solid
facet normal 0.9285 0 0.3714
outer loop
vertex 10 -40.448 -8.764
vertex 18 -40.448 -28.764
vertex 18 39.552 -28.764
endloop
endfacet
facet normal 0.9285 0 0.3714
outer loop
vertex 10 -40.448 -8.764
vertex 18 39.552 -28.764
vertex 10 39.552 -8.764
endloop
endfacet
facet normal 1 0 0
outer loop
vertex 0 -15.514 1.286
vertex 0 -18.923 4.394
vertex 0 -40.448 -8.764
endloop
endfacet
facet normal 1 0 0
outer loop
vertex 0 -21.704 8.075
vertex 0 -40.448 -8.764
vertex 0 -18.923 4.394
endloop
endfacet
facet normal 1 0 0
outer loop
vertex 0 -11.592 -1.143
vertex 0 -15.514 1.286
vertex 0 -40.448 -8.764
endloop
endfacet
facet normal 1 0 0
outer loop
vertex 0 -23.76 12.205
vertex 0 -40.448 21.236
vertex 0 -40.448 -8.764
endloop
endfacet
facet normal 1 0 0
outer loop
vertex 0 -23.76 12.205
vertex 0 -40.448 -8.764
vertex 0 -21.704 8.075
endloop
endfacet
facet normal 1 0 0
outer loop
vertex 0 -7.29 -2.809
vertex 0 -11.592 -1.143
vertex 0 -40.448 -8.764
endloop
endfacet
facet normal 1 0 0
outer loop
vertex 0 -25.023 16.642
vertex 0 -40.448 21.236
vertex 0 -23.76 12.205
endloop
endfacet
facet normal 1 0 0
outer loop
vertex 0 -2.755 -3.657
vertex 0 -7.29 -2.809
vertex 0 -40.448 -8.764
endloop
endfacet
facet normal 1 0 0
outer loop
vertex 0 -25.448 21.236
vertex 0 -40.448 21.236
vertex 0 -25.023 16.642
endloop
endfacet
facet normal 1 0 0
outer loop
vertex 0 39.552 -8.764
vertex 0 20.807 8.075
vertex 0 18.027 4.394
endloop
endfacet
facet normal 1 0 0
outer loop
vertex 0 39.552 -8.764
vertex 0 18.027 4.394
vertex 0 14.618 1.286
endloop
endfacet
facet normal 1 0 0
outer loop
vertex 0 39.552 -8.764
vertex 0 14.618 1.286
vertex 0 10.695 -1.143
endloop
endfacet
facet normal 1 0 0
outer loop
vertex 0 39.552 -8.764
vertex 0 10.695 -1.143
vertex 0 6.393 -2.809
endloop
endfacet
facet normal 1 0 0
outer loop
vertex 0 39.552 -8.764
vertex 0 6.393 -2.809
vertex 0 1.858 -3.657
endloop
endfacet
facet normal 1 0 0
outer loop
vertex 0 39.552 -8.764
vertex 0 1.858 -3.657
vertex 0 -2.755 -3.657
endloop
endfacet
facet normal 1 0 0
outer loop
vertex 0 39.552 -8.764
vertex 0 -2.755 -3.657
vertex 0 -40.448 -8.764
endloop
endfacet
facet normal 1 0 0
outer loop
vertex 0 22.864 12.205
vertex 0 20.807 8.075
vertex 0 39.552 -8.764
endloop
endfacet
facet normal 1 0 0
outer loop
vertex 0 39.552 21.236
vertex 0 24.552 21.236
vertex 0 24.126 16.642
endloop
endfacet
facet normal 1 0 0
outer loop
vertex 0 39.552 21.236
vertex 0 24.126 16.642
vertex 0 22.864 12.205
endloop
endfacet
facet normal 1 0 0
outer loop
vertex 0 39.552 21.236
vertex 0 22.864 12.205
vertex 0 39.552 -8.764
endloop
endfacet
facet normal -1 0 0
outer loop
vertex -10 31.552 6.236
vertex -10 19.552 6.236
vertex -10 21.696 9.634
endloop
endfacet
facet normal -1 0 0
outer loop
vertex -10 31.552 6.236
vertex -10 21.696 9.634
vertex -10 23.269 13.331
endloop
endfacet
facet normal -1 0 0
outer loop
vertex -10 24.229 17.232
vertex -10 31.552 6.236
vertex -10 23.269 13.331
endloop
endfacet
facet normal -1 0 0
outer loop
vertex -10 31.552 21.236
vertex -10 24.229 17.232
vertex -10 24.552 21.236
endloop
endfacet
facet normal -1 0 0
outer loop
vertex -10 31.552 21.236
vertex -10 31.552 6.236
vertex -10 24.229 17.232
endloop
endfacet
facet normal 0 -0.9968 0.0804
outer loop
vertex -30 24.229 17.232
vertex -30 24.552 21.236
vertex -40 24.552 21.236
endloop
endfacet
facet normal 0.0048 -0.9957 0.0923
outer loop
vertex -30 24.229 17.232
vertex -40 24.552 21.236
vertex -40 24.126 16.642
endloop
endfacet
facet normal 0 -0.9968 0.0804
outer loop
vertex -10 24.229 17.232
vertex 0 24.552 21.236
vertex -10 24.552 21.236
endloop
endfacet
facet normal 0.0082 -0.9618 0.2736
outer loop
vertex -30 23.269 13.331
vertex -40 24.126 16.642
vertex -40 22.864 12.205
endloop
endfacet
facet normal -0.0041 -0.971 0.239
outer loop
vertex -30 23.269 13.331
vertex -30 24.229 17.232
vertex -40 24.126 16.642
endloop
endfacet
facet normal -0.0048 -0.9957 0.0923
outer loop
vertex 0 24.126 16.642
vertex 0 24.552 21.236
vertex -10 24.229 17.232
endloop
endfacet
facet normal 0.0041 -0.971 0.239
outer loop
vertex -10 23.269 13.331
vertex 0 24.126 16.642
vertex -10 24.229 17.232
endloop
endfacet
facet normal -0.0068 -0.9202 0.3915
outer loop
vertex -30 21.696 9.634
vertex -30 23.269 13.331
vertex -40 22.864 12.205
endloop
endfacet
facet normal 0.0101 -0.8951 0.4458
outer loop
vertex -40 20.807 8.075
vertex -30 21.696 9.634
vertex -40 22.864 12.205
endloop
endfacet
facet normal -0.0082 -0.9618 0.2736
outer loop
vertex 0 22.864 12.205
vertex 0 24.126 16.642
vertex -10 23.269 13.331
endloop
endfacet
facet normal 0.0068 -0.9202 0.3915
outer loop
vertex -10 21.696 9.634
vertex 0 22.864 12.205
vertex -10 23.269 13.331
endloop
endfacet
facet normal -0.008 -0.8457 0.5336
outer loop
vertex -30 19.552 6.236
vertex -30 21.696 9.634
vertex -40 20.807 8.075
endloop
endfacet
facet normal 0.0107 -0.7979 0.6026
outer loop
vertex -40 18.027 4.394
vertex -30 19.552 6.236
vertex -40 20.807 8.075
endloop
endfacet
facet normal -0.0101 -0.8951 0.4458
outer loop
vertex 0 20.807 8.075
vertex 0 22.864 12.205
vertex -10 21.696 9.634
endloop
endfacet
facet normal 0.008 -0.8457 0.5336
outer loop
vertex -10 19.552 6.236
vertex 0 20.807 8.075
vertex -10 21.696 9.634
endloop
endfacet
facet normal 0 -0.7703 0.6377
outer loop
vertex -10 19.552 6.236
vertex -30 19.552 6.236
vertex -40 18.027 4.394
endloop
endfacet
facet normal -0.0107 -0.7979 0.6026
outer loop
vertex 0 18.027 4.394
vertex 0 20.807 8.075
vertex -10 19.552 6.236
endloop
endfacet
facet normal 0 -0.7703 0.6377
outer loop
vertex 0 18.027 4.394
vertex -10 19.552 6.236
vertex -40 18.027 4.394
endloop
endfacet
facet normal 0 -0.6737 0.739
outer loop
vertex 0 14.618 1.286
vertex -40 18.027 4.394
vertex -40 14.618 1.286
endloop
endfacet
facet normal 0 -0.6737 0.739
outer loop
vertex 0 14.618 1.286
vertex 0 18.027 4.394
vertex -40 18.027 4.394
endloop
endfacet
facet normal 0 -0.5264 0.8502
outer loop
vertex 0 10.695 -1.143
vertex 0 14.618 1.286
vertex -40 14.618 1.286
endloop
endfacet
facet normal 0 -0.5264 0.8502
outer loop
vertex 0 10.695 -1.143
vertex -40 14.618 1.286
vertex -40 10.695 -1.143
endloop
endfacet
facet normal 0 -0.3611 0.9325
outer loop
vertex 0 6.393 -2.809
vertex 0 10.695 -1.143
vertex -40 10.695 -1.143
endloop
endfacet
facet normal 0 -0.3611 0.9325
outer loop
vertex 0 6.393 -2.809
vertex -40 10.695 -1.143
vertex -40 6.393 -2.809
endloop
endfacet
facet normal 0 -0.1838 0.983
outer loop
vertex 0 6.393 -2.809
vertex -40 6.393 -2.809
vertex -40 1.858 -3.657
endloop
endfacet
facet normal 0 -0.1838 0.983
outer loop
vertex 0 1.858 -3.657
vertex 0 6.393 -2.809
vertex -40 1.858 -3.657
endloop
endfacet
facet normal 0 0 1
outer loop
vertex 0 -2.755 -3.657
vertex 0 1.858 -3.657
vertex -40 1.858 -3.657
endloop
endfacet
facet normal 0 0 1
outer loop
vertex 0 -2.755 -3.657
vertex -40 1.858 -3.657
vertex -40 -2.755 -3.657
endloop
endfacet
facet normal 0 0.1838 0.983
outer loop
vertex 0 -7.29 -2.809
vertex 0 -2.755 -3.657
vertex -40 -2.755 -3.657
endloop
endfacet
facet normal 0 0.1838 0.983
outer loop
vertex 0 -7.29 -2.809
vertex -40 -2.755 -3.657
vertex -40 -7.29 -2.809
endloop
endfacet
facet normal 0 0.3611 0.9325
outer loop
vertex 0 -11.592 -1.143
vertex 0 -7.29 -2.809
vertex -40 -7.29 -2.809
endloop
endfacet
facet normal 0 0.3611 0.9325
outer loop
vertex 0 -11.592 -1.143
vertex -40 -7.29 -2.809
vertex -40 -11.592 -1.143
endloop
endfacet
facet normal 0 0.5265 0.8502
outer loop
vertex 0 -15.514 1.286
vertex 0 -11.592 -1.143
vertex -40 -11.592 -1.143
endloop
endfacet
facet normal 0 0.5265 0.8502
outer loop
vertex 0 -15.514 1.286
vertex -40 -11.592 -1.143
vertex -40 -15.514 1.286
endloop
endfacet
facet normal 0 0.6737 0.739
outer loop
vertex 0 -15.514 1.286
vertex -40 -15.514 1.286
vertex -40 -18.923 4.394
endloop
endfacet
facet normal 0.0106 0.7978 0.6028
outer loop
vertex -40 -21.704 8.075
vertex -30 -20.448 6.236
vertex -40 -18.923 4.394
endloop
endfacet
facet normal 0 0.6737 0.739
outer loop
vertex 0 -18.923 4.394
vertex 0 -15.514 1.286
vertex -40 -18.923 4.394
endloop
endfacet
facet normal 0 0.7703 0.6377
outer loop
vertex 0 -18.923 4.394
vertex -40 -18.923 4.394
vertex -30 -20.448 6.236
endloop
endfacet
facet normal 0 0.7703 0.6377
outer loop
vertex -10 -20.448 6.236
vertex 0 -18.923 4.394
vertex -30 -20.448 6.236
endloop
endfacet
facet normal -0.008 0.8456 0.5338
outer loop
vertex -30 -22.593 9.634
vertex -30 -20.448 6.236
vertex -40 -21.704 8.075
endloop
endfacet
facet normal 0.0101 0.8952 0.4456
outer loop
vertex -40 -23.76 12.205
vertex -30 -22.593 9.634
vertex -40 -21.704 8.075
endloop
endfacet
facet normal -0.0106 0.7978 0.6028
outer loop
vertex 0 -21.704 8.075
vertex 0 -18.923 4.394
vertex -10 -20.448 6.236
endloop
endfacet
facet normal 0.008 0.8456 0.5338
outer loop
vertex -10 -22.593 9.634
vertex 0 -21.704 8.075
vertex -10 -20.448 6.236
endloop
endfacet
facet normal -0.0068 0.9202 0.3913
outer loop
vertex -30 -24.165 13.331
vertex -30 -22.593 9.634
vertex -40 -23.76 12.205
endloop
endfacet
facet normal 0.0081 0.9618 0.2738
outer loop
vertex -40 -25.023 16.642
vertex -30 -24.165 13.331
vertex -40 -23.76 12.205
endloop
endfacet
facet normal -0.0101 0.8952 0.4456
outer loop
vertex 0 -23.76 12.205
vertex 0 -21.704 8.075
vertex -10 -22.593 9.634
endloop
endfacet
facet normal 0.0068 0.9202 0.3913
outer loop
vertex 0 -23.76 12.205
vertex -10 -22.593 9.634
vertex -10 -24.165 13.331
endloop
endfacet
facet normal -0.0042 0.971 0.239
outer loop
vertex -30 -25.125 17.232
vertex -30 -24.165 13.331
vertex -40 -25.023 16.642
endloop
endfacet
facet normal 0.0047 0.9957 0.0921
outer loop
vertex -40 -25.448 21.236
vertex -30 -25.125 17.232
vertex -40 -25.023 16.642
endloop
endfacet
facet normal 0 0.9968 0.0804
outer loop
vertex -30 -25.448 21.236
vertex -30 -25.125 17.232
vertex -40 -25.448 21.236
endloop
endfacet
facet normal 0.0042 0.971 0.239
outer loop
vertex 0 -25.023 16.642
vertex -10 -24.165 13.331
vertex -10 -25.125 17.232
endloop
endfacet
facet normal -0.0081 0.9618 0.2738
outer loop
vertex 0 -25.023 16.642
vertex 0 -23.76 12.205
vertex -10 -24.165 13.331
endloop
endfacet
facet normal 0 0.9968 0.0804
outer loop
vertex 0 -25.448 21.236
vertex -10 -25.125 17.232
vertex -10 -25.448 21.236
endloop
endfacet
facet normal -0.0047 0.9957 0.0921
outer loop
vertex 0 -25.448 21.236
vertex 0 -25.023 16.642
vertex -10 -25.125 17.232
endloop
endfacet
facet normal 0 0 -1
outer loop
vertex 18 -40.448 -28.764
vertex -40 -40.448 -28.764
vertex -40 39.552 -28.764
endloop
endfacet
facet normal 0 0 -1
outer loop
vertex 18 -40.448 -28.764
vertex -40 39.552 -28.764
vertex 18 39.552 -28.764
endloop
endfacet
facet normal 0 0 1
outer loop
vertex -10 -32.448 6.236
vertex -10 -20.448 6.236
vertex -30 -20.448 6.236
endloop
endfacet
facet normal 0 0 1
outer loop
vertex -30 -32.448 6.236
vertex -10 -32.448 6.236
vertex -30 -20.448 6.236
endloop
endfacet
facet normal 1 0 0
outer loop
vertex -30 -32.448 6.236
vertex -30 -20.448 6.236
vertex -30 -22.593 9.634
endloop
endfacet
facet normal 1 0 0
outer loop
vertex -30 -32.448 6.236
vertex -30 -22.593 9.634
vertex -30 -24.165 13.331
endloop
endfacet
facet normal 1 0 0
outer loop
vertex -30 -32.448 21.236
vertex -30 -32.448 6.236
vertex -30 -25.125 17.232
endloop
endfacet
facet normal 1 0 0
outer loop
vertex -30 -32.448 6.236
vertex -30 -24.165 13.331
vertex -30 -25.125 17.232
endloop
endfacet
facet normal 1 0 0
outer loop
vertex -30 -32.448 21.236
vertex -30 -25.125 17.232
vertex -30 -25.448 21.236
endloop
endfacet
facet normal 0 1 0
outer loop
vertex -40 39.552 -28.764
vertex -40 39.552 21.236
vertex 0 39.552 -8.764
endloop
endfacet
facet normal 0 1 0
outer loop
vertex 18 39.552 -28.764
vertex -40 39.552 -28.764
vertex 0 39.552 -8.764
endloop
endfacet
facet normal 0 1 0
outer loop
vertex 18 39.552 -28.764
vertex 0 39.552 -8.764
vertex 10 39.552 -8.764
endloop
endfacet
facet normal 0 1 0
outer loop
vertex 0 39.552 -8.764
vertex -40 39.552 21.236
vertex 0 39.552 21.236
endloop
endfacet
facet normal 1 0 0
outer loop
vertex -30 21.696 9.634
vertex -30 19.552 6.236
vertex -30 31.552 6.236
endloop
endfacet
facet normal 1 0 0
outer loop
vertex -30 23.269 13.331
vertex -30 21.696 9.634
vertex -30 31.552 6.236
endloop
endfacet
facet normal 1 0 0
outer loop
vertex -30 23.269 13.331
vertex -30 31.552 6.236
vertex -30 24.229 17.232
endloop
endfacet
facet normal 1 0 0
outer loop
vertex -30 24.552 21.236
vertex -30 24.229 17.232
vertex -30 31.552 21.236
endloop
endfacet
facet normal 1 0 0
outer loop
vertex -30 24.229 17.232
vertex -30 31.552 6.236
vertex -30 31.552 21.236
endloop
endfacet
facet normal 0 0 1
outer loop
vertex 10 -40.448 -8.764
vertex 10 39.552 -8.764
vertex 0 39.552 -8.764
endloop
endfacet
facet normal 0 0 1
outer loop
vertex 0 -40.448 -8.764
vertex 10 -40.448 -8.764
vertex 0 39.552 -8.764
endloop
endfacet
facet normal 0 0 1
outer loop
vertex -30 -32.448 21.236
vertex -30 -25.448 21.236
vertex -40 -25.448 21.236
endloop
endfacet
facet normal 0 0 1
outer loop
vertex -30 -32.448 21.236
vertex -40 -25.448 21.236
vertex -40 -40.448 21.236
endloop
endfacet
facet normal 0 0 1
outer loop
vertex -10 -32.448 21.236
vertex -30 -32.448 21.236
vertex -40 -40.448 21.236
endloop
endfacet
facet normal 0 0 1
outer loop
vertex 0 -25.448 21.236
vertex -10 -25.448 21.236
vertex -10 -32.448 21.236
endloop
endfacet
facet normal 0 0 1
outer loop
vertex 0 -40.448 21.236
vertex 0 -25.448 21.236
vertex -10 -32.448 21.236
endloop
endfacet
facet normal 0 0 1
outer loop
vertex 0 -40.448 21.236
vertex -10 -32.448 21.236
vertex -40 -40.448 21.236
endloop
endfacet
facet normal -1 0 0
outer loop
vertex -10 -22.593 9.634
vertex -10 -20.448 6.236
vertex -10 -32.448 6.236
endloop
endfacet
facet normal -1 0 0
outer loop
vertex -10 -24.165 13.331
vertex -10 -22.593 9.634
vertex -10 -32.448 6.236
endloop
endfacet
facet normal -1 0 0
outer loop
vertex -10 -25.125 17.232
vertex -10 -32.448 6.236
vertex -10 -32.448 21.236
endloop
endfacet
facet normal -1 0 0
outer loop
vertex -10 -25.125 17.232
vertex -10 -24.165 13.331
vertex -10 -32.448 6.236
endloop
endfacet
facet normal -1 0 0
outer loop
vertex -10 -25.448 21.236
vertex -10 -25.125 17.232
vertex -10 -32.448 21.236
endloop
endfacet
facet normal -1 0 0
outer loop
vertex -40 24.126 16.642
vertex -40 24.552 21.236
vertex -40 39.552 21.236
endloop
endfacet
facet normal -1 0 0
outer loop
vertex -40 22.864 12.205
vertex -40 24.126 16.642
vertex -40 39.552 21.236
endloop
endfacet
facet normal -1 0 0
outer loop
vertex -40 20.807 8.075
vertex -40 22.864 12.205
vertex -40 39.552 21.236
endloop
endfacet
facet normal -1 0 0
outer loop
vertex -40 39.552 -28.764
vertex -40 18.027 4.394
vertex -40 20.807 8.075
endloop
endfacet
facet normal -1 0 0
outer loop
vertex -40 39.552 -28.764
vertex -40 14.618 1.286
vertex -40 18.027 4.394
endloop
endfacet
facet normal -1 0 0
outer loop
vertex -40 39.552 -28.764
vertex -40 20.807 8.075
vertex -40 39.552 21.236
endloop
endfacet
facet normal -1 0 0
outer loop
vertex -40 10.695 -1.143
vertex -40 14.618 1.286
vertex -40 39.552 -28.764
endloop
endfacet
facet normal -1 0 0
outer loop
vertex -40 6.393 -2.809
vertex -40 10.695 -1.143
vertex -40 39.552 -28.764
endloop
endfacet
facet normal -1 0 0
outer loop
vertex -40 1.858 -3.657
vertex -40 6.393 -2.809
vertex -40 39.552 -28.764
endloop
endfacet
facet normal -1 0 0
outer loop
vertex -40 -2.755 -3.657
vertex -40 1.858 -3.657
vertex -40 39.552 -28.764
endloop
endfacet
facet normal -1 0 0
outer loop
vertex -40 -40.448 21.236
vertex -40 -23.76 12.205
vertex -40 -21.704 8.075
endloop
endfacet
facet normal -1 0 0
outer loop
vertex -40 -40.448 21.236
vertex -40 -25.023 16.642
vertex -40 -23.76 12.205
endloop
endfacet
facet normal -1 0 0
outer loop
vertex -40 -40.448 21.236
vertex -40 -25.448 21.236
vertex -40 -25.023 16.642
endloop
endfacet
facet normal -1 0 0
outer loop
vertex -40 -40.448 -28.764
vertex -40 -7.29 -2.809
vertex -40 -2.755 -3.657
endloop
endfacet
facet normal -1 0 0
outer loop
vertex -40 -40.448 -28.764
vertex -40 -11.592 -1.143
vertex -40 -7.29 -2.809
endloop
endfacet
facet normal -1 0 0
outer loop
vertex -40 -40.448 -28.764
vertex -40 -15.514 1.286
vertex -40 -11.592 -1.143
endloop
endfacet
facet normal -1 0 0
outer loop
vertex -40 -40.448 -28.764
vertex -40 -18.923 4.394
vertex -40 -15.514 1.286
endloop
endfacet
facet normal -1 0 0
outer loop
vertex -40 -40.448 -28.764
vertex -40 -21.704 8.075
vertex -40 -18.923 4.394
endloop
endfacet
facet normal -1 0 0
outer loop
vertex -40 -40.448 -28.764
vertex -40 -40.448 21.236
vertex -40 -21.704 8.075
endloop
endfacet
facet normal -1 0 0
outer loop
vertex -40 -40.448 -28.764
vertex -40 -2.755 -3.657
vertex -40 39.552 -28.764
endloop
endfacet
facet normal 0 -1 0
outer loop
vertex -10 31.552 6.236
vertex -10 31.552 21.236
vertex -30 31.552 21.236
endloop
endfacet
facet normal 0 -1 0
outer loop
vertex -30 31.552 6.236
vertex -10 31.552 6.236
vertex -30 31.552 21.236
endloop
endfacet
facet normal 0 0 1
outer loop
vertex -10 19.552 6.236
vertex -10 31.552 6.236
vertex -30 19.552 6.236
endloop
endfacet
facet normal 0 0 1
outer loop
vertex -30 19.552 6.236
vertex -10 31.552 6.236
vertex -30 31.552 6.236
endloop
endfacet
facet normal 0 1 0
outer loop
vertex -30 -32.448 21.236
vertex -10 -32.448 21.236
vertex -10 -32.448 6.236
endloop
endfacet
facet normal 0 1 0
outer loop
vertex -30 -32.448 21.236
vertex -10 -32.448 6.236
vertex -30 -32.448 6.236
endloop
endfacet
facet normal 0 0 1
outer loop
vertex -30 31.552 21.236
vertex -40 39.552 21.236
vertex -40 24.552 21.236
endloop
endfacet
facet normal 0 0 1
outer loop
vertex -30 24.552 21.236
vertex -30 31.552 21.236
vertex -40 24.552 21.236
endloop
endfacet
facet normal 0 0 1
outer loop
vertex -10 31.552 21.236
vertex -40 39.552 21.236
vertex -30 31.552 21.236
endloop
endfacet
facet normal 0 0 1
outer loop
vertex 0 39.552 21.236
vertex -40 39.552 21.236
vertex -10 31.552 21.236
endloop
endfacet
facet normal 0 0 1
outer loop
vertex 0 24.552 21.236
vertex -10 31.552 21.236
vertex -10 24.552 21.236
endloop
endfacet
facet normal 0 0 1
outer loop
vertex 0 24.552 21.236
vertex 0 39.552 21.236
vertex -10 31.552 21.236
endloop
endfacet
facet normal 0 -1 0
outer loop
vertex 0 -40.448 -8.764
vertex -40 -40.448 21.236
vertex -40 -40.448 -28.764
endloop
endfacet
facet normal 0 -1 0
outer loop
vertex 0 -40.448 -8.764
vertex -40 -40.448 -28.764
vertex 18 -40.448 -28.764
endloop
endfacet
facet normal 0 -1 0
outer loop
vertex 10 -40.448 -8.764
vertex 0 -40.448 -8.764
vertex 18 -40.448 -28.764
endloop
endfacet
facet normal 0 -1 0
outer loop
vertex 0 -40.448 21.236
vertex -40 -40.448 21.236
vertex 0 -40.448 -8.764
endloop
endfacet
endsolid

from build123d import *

# Parameters (mm, degrees)
F1_DEPTH = 40
F3_DEPTH = 80
F5_W     = 20
F5_H     = 15
F6_DEPTH = 64


with BuildPart() as f1:
    # F0 (on Right) → F1 (new body)
    with BuildSketch(Plane.YZ):
        with BuildLine():
            Line((-25.4482409358, 21.236214526), (-40.4482409358, 21.236214526))
            Line((-40.4482409358, 21.236214526), (-40.4482409358, -8.763785474))
            Line((-40.4482409358, -8.763785474), (39.5517590642, -8.763785474))
            Line((39.5517590642, -8.763785474), (39.5517590642, 21.236214526))
            Line((39.5517590642, 21.236214526), (24.5517590642, 21.236214526))
            ThreePointArc((24.5517590642, 21.236214526), (-0.4482409358, -3.763785474), (-25.4482409358, 21.236214526))
        make_face()
    extrude(amount=-F1_DEPTH)

    # F2 (on face) → F3 (join, through all)
    with BuildSketch(Plane.XZ.offset(40.4482409358)):
        Polygon((10, -8.763785474), (-40, -8.763785474), (-40, -28.763785474), (18, -28.763785474), align=None)
    extrude(amount=-F3_DEPTH)

    # F5 (on offset) → F6 (cut)
    with BuildSketch(Plane(origin=(0, 31.5517590642, 0), x_dir=(-1, 0, 0), z_dir=(0, 1, 0))):
        with Locations((20, 13.736214526)):
            Rectangle(F5_W, F5_H)
    extrude(amount=-F6_DEPTH, mode=Mode.SUBTRACT)


solid = f1.part
